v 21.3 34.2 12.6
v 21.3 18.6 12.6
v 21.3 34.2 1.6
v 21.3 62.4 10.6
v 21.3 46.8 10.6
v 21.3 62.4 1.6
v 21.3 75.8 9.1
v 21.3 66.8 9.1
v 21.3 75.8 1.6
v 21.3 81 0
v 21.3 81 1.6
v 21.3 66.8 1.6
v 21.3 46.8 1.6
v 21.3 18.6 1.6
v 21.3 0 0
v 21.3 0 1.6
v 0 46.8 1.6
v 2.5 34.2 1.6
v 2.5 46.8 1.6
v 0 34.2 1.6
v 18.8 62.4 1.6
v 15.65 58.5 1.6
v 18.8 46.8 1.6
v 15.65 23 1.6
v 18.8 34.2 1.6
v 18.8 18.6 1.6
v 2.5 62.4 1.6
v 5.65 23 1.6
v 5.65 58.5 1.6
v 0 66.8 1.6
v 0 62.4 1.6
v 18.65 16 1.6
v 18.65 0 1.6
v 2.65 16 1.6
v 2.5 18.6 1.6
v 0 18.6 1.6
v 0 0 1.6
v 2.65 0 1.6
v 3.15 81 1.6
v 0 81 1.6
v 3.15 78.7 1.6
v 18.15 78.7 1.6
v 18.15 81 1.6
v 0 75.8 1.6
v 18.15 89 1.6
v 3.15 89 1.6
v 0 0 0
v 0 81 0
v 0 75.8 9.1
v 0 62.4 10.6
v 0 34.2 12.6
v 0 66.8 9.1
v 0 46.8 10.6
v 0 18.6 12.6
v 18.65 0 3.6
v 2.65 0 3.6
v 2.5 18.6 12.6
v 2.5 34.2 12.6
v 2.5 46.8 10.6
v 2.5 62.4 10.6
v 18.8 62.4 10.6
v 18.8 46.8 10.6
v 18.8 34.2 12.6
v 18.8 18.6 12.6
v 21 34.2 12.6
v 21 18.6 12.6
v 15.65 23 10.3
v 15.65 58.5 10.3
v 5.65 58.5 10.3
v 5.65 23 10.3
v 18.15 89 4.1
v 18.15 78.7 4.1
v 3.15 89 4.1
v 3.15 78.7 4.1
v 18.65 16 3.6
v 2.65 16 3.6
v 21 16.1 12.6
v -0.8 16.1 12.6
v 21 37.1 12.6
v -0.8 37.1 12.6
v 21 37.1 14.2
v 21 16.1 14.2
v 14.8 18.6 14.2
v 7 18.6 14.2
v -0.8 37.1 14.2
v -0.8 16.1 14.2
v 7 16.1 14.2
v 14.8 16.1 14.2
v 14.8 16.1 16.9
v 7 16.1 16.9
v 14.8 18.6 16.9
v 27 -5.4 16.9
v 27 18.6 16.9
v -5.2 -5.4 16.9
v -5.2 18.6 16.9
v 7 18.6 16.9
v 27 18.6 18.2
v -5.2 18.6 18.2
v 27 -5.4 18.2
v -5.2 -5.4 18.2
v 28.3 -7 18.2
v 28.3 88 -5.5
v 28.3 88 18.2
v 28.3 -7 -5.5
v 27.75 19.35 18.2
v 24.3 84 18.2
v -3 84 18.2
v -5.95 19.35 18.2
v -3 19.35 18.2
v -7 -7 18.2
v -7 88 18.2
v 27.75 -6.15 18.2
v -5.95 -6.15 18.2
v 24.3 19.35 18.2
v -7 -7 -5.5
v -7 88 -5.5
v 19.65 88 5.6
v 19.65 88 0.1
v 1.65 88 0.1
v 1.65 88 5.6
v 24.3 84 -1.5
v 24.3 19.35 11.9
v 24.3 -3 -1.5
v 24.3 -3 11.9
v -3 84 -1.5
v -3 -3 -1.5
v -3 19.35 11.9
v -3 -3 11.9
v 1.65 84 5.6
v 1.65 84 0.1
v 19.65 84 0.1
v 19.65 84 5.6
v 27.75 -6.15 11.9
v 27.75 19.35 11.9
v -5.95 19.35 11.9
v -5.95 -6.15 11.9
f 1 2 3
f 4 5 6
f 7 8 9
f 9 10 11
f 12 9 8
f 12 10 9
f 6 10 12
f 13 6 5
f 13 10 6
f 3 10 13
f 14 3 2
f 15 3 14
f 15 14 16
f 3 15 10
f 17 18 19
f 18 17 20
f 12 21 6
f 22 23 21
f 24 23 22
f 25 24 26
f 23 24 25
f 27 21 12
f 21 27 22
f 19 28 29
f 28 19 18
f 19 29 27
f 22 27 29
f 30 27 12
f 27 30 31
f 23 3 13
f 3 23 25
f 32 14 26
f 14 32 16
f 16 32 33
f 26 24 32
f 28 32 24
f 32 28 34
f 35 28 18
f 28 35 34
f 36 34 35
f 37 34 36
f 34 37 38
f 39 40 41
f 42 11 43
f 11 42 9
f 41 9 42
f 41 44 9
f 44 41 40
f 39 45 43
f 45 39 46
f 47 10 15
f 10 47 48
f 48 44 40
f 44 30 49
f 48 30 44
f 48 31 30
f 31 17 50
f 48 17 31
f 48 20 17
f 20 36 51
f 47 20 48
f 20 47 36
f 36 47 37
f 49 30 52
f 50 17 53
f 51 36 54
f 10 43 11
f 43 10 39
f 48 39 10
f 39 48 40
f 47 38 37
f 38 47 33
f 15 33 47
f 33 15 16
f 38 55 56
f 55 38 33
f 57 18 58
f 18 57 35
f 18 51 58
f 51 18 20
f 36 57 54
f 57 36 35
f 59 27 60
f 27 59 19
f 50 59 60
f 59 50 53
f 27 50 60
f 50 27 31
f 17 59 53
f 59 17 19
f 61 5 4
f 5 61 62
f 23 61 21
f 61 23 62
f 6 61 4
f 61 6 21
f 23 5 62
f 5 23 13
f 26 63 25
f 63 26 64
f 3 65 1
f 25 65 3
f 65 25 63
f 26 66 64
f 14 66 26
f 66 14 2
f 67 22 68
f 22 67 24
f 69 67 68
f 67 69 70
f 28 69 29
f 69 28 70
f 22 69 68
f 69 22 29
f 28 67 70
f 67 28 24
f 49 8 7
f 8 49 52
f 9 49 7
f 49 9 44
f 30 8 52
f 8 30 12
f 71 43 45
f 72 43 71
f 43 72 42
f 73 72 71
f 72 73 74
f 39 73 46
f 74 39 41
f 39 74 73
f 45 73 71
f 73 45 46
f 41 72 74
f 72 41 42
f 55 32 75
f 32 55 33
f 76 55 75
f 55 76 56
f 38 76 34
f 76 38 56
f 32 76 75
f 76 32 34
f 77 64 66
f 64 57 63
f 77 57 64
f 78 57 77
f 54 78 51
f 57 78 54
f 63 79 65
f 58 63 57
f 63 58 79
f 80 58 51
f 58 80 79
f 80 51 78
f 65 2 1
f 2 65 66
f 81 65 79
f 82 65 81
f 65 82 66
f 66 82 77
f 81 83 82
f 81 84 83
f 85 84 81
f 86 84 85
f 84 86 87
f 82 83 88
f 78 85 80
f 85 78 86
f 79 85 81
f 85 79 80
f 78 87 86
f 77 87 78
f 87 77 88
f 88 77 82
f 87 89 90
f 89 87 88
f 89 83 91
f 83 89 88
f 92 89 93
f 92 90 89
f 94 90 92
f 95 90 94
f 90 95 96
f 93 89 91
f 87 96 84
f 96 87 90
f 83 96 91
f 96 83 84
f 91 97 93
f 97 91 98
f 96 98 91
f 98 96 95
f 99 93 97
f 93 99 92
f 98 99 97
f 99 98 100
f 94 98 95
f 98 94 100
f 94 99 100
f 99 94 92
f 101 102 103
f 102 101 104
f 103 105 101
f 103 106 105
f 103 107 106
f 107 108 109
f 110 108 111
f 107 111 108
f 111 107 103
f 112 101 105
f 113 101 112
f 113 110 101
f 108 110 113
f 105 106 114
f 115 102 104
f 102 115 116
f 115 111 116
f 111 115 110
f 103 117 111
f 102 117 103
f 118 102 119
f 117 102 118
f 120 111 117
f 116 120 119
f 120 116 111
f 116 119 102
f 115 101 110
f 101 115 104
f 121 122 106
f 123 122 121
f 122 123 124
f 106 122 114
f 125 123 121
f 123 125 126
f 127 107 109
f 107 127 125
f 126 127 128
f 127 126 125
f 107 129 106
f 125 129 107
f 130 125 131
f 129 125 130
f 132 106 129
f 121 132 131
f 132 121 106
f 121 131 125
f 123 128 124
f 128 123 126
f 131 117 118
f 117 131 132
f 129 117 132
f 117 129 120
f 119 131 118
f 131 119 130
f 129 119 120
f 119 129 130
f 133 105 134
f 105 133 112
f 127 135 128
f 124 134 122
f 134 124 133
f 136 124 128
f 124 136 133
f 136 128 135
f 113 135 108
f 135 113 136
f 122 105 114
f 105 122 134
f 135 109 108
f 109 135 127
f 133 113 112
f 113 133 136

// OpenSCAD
//Created by Michael Anderson 12-9-2013

//Roomnode case for Jeenode v6 and roomboard v2
jeeNodeW = 21.3;
jeeNodeL = 81;
jeeNodeH = 1.6;

	//Connectors/Components
	
		//Headers
		CpW = 2.5;
		CpL = 15.6;
		CpH = 9;
		
		Cp4X = jeeNodeL-jeeNodeL;			
		Cp4Y = jeeNodeL-62.4;
		Cp4Z = jeeNodeH;
		
		Cp3X = jeeNodeL-jeeNodeL;			
		Cp3Y = jeeNodeL-34.2;
		Cp3Z = jeeNodeH;
		
		Cp2X = jeeNodeW-CpW;		
		Cp2Y = jeeNodeL-34.2;
		Cp2Z = jeeNodeH;
		
		Cp1X = jeeNodeW-CpW;			
		Cp1Y = jeeNodeL-62.4;
		Cp1Z = jeeNodeH;
	
		//Atmega
		Cat328W = 10;
		Cat328L = 35.5;
		Cat328H = 8.7;
		Cat328X = (jeeNodeW - Cat328W) /2;
		Cat328Y = jeeNodeL-58;
		Cat328Z = jeeNodeH;
		
		//Power Components
		CpwrW = jeeNodeW;
		CpwrL = 9;
		CpwrH = 7.5;
		CpwrX = jeeNodeL-jeeNodeL;
		CpwrY = jeeNodeL-14.2;
		CpwrZ = jeeNodeH;
		
		//FTDI Connector
		CftdiW = 15;
		CftdiL = 10.3;
		CftdiH = 2.5;
		CftdiX = (jeeNodeW - CftdiW) /2;
		CftdiY = jeeNodeL - 2.3;
		CftdiZ = jeeNodeH;
		
		//Radio
		Crf12W = 16;
		Crf12L = Crf12W;
		Crf12H = 2;
		Crf12X = (jeeNodeW - Crf12W) /2;
		Crf12Y = jeeNodeL-jeeNodeL;
		Crf12Z = jeeNodeH;
// Room board
	rbHeaderW	= CpW;
	rbHeaderL = CpL;
	rbHeaderH = 2;
	rbHeader1X = Cp4X;
	rbHeader1Y = Cp4Y;
	rbHeader1Z = jeeNodeH + CpH;
	rbHeader2X = Cp4X+(jeeNodeW-CpW);
	rbHeader2Y = Cp4Y;
	rbHeader2Z = jeeNodeH + CpH;

	
	roomBoardW = 21.8;
	roomBoardL = 21;
	roomBoardH = 1.6;
	roomBoardX = Cp4X - .8;
	roomBoardY = Cp4Y - 2.5;
	roomBoardZ = jeeNodeH + CpH + rbHeaderH;
	
//PIR
	
	pirHeaderW = 7.8;
	pirHeaderL = 2.5;
	pirHeaderH = 2.7;
	pirHeaderX = Cp4X + (roomBoardW - pirHeaderW) / 2;
	pirHeaderY = Cp4Y-pirHeaderL;
	pirHeaderZ = roomBoardH+jeeNodeH+CpH+rbHeaderH;

	pirW = 32.2;
	pirL = 24;
	pirH = 1.3;
	pirX = Cp4X+(roomBoardW-pirW)/2;
	pirY = Cp4Y-pirL;
	pirZ = roomBoardH+jeeNodeH+CpH+rbHeaderH+pirHeaderH;

//jeeCase Bottom
	
	jeeNodeGap = 3; //offset from jeeNode
	wallThick = 4; //Wall thickness of case
	bottomGap = 1.5; //space under board for solder points
	caseHeight = pirZ+pirH+wallThick+bottomGap; //height of case


// jeenode board
module jeeNode(){

	union(){
	//board
	makeCube (0,0,0,jeeNodeW, jeeNodeL, jeeNodeH,"green");
	//headers
	makeCube (Cp4X, Cp4Y, Cp4Z, CpW, CpL, CpH, "black");
	makeCube (Cp3X, Cp3Y, Cp3Z, CpW, CpL, CpH, "black");
	makeCube (Cp2X, Cp2Y, Cp2Z, CpW, CpL, CpH, "black");
	makeCube (Cp1X, Cp1Y, Cp1Z, CpW, CpL, CpH, "black");
	//Atmega	
	makeCube (Cat328X, Cat328Y, Cat328Z, Cat328W, Cat328L, Cat328H, "gray");
 	//Power Components
	makeCube (CpwrX, CpwrY, CpwrZ, CpwrW, CpwrL, CpwrH, "orange");
	//FTDI Pins
	makeCube (CftdiX, CftdiY, CftdiZ, CftdiW, CftdiL, CftdiH);
	//rf12
	makeCube (Crf12X, Crf12Y, Crf12Z, Crf12W, Crf12L, Crf12H, "lightgreen");
	};
	
};

module roomBoard(){
	union(){
		//room board 
		//header 1
		makeCube(rbHeader1X, rbHeader1Y, rbHeader1Z, rbHeaderW, rbHeaderL, rbHeaderH, "orange");
		//header 2
		makeCube(rbHeader2X,rbHeader2Y,rbHeader2Z , rbHeaderW, rbHeaderL, rbHeaderH, "orange");
		//roomboard
		makeCube(roomBoardX, roomBoardY, roomBoardZ, roomBoardW, roomBoardL, roomBoardH, "orange");

	};
};

module pir(){
		//pir Header
		makeCube(pirHeaderX, pirHeaderY, pirHeaderZ, pirHeaderW, pirHeaderL, pirHeaderH, "pink");
		//pir Board
		makeCube(pirX, pirY, pirZ, pirW, pirL, pirH, "pink");

};

module makeCube(x,y,z,w,l,h,c){

translate([x, y, z]) color(c) cube ([w, l, h]);

};

module jeeCaseBottom(){

caseBottomX = -jeeNodeGap - wallThick;
caseBottomY = -jeeNodeGap - wallThick;
caseBottomZ = -bottomGap - wallThick;  //1.5 is board offset for solder points
caseBottomW = jeeNodeW + jeeNodeGap*2 + wallThick*2;
caseBottomL = jeeNodeL + jeeNodeGap*2 + wallThick*2;
caseBottomH = caseHeight;
caseBottomNegX = -jeeNodeGap;
caseBottomNegY = -jeeNodeGap;
caseBottomNegZ = -bottomGap;
caseBottomNegW = jeeNodeW + jeeNodeGap*2;
caseBottomNegL = jeeNodeL + jeeNodeGap*2;
caseBottomNegH = caseHeight;
ftdiOffset = 3; //amount of space around ftdi
pirOffset = 1.5;
	difference(){
		//full size cube
		makeCube(caseBottomX, caseBottomY, caseBottomZ, caseBottomW, caseBottomL, caseBottomH, "red");
		//inside cutout
		makeCube(caseBottomNegX, caseBottomNegY, caseBottomNegZ, caseBottomNegW, caseBottomNegL, caseBottomNegH, "red");
		//FTDI cutout
		makeCube (CftdiX-ftdiOffset/2, CftdiY, CftdiZ-ftdiOffset/2, CftdiW+ftdiOffset, CftdiL, CftdiH+ftdiOffset);
		//PIR cutout
		makeCube(pirX-pirOffset/2, pirY-pirOffset/2, pirZ-5, pirW+pirOffset, pirL+pirOffset, pirH+caseHeight, "pink");
	};

};

jeeNode();

roomBoard();

pir();

jeeCaseBottom();
